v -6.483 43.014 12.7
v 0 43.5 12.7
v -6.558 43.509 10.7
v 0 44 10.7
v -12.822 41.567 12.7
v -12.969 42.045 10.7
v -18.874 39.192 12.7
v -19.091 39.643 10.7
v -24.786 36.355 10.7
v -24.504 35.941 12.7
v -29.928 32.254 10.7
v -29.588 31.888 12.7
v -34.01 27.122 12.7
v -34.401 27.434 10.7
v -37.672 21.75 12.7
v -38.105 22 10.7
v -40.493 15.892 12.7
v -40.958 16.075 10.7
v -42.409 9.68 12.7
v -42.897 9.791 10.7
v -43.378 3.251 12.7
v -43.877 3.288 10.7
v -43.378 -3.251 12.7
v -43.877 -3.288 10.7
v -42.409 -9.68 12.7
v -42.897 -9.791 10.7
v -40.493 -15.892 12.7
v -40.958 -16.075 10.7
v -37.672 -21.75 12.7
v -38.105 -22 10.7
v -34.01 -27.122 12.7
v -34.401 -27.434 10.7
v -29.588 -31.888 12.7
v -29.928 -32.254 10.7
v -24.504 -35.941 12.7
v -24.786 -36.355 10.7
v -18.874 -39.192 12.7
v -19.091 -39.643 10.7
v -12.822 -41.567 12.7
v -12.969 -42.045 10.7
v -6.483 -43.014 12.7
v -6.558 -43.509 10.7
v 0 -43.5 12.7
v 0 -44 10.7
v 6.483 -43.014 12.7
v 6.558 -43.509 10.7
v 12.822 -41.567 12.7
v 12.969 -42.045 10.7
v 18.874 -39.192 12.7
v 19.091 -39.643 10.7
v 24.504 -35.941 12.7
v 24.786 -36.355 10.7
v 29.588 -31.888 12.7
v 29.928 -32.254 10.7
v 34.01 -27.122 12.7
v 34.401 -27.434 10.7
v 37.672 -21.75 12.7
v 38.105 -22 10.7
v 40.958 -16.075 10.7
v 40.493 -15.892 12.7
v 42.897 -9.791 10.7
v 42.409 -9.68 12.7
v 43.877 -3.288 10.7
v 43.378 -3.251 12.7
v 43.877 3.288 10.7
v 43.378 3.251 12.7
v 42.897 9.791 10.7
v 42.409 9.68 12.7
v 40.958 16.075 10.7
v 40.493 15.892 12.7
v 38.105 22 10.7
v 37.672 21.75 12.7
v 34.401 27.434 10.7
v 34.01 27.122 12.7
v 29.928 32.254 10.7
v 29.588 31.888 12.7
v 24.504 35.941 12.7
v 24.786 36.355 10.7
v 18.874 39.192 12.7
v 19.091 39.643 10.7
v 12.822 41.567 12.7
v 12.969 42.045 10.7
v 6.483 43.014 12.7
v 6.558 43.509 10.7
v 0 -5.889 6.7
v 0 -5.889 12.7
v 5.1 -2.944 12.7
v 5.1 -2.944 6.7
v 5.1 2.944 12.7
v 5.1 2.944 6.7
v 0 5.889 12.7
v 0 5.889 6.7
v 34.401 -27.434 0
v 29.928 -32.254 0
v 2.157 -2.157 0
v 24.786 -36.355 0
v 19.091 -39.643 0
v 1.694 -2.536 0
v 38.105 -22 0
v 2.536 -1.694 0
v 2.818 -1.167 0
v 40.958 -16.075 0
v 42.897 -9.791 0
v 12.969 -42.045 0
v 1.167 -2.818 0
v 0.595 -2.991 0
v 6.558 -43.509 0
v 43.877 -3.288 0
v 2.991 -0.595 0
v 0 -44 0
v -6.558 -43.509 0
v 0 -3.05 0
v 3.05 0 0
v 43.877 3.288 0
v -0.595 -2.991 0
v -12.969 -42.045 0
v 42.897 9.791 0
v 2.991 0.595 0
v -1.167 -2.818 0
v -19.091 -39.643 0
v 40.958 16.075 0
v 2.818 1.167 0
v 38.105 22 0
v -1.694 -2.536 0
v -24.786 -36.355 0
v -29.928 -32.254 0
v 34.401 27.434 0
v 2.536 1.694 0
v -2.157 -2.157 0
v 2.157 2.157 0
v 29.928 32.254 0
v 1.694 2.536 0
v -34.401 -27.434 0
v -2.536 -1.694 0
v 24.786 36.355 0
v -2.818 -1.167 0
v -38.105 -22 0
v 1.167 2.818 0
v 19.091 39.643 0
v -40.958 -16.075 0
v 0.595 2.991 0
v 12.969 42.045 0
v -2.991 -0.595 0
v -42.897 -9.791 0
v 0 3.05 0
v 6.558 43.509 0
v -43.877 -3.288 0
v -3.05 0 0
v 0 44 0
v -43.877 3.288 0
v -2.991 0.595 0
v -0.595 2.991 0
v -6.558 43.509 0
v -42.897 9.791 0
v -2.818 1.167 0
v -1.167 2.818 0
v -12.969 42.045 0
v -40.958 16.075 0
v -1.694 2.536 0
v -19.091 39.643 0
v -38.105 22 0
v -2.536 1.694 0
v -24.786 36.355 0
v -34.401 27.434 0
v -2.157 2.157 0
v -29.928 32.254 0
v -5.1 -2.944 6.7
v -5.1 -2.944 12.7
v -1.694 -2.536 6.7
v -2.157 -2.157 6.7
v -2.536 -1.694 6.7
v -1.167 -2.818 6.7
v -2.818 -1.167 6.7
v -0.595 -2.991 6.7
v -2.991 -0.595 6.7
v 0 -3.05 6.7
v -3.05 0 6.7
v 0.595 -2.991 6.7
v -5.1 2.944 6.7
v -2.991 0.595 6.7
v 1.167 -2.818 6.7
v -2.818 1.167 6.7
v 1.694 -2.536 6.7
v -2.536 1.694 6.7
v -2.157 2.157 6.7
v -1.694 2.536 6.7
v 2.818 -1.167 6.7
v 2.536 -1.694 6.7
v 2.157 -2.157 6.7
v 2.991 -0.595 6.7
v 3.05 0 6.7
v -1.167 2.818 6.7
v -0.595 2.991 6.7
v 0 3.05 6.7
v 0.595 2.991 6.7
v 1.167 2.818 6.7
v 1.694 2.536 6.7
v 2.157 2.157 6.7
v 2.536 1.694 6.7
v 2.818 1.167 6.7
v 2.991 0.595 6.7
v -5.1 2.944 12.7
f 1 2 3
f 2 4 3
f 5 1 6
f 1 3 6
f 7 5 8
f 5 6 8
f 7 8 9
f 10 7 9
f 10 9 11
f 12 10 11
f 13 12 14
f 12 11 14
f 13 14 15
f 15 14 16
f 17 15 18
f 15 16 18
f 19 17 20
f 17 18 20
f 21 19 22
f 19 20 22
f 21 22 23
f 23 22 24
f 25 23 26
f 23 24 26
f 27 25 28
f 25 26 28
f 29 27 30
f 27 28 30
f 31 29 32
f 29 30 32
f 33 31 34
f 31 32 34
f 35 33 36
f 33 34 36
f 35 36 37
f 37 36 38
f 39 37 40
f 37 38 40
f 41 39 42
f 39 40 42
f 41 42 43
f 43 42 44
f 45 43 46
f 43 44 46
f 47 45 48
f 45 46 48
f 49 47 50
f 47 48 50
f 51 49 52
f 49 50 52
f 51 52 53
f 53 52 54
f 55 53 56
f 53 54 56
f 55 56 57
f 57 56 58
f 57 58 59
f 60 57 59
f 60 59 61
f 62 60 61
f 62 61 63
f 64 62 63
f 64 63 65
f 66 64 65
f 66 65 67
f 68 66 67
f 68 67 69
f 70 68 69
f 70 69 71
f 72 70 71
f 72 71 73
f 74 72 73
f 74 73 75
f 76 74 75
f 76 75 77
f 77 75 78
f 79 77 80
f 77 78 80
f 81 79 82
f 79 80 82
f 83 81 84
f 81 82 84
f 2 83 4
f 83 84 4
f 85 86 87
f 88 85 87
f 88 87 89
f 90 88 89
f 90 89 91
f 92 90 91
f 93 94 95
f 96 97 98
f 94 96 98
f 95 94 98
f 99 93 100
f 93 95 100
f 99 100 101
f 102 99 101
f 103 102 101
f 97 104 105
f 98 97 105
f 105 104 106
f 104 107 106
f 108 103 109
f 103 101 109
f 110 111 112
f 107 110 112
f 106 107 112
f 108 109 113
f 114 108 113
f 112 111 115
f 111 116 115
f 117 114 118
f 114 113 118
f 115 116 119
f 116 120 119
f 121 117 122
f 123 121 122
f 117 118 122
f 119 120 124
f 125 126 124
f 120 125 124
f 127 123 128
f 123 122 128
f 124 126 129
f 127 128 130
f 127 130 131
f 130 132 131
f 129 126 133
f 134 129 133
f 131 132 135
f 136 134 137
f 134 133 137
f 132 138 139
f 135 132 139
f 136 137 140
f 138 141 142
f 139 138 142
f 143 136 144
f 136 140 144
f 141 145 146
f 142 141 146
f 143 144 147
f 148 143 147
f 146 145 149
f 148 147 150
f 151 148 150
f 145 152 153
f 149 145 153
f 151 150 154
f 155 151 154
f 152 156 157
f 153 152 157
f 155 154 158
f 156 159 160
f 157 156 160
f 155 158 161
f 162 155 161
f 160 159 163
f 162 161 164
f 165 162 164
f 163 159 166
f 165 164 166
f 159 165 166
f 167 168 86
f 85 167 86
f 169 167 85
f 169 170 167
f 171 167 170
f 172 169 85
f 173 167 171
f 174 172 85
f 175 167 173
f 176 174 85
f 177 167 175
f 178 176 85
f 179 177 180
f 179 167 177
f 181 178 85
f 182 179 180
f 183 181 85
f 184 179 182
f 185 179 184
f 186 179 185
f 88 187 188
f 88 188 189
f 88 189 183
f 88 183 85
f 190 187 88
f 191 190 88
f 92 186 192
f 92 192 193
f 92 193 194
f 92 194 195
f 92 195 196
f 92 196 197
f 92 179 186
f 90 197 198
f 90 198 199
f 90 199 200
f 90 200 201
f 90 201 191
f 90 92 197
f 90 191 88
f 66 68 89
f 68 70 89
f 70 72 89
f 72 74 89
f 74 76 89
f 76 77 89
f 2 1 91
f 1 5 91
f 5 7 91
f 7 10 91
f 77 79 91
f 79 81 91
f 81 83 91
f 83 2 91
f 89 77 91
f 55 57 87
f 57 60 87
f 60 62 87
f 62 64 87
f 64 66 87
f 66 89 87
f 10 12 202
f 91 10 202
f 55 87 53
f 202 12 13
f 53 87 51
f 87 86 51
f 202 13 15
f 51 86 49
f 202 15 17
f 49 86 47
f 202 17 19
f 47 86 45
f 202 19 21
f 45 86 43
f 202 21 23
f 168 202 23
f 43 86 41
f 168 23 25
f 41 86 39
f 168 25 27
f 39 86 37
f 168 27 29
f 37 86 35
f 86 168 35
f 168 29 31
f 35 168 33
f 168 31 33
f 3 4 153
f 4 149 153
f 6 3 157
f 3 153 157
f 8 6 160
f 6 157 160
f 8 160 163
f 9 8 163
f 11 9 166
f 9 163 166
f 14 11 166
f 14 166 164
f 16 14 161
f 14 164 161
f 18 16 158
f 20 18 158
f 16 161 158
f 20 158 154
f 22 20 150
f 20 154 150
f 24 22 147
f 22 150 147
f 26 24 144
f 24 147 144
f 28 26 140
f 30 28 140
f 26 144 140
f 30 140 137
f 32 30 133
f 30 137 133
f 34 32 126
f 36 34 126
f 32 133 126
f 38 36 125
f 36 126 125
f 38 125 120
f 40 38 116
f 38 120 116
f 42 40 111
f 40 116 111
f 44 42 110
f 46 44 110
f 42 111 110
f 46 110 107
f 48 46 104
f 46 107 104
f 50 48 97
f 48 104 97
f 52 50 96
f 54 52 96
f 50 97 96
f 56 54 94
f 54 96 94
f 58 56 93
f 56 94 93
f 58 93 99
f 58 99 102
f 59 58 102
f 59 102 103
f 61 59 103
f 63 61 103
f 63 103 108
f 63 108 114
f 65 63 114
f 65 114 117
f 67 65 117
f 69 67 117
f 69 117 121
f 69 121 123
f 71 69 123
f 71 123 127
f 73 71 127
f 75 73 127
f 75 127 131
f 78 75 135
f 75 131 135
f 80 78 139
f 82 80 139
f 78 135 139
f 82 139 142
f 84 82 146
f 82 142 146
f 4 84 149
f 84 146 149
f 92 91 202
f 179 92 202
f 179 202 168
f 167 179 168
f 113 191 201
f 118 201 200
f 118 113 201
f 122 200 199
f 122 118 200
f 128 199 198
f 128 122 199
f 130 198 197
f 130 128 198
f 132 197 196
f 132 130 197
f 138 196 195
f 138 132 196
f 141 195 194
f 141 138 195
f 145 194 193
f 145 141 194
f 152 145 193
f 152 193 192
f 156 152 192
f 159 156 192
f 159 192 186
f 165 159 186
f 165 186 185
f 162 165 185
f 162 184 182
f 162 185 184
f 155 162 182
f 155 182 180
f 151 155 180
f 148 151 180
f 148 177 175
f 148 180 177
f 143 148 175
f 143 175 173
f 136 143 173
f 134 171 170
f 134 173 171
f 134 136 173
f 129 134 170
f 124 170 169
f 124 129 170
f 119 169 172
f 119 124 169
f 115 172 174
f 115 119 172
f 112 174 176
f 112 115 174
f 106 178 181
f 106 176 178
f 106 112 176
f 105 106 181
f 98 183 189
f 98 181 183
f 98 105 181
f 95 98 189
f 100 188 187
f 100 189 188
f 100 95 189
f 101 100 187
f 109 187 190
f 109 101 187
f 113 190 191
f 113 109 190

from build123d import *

# Parameters (mm, degrees)
SKETCH001_R       = 3.05
POCKET_DEPTH      = 0.001
POCKET_DEPTH_BACK = -12.701
POCKET001_DEPTH   = 6


with BuildPart() as part:
    # Sketch → Revolution (revolve)
    with BuildSketch(Plane.YZ):
        Polygon((0, 12.7), (43.5, 12.7), (44, 10.7), (44, 0), (0, 0), align=None)
    revolve(axis=Axis((0, 0, 0), (0, 0, 1)))

    # Sketch001 → Pocket (cut, two sides)
    with BuildSketch(Plane.XY) as pocket_sk:
        Circle(SKETCH001_R)
    extrude(amount=-POCKET_DEPTH, mode=Mode.SUBTRACT)
    extrude(pocket_sk.sketch, amount=-POCKET_DEPTH_BACK, mode=Mode.SUBTRACT)

    # Sketch002 → Pocket001 (cut)
    with BuildSketch(Plane.XY.offset(12.7)):
        Polygon((0, 5.888973), (-5.1, 2.944486), (-5.1, -2.944486), (0, -5.888973), (5.1, -2.944486), (5.1, 2.944486), align=None)
    extrude(amount=-POCKET001_DEPTH, mode=Mode.SUBTRACT)


solid = part.part
